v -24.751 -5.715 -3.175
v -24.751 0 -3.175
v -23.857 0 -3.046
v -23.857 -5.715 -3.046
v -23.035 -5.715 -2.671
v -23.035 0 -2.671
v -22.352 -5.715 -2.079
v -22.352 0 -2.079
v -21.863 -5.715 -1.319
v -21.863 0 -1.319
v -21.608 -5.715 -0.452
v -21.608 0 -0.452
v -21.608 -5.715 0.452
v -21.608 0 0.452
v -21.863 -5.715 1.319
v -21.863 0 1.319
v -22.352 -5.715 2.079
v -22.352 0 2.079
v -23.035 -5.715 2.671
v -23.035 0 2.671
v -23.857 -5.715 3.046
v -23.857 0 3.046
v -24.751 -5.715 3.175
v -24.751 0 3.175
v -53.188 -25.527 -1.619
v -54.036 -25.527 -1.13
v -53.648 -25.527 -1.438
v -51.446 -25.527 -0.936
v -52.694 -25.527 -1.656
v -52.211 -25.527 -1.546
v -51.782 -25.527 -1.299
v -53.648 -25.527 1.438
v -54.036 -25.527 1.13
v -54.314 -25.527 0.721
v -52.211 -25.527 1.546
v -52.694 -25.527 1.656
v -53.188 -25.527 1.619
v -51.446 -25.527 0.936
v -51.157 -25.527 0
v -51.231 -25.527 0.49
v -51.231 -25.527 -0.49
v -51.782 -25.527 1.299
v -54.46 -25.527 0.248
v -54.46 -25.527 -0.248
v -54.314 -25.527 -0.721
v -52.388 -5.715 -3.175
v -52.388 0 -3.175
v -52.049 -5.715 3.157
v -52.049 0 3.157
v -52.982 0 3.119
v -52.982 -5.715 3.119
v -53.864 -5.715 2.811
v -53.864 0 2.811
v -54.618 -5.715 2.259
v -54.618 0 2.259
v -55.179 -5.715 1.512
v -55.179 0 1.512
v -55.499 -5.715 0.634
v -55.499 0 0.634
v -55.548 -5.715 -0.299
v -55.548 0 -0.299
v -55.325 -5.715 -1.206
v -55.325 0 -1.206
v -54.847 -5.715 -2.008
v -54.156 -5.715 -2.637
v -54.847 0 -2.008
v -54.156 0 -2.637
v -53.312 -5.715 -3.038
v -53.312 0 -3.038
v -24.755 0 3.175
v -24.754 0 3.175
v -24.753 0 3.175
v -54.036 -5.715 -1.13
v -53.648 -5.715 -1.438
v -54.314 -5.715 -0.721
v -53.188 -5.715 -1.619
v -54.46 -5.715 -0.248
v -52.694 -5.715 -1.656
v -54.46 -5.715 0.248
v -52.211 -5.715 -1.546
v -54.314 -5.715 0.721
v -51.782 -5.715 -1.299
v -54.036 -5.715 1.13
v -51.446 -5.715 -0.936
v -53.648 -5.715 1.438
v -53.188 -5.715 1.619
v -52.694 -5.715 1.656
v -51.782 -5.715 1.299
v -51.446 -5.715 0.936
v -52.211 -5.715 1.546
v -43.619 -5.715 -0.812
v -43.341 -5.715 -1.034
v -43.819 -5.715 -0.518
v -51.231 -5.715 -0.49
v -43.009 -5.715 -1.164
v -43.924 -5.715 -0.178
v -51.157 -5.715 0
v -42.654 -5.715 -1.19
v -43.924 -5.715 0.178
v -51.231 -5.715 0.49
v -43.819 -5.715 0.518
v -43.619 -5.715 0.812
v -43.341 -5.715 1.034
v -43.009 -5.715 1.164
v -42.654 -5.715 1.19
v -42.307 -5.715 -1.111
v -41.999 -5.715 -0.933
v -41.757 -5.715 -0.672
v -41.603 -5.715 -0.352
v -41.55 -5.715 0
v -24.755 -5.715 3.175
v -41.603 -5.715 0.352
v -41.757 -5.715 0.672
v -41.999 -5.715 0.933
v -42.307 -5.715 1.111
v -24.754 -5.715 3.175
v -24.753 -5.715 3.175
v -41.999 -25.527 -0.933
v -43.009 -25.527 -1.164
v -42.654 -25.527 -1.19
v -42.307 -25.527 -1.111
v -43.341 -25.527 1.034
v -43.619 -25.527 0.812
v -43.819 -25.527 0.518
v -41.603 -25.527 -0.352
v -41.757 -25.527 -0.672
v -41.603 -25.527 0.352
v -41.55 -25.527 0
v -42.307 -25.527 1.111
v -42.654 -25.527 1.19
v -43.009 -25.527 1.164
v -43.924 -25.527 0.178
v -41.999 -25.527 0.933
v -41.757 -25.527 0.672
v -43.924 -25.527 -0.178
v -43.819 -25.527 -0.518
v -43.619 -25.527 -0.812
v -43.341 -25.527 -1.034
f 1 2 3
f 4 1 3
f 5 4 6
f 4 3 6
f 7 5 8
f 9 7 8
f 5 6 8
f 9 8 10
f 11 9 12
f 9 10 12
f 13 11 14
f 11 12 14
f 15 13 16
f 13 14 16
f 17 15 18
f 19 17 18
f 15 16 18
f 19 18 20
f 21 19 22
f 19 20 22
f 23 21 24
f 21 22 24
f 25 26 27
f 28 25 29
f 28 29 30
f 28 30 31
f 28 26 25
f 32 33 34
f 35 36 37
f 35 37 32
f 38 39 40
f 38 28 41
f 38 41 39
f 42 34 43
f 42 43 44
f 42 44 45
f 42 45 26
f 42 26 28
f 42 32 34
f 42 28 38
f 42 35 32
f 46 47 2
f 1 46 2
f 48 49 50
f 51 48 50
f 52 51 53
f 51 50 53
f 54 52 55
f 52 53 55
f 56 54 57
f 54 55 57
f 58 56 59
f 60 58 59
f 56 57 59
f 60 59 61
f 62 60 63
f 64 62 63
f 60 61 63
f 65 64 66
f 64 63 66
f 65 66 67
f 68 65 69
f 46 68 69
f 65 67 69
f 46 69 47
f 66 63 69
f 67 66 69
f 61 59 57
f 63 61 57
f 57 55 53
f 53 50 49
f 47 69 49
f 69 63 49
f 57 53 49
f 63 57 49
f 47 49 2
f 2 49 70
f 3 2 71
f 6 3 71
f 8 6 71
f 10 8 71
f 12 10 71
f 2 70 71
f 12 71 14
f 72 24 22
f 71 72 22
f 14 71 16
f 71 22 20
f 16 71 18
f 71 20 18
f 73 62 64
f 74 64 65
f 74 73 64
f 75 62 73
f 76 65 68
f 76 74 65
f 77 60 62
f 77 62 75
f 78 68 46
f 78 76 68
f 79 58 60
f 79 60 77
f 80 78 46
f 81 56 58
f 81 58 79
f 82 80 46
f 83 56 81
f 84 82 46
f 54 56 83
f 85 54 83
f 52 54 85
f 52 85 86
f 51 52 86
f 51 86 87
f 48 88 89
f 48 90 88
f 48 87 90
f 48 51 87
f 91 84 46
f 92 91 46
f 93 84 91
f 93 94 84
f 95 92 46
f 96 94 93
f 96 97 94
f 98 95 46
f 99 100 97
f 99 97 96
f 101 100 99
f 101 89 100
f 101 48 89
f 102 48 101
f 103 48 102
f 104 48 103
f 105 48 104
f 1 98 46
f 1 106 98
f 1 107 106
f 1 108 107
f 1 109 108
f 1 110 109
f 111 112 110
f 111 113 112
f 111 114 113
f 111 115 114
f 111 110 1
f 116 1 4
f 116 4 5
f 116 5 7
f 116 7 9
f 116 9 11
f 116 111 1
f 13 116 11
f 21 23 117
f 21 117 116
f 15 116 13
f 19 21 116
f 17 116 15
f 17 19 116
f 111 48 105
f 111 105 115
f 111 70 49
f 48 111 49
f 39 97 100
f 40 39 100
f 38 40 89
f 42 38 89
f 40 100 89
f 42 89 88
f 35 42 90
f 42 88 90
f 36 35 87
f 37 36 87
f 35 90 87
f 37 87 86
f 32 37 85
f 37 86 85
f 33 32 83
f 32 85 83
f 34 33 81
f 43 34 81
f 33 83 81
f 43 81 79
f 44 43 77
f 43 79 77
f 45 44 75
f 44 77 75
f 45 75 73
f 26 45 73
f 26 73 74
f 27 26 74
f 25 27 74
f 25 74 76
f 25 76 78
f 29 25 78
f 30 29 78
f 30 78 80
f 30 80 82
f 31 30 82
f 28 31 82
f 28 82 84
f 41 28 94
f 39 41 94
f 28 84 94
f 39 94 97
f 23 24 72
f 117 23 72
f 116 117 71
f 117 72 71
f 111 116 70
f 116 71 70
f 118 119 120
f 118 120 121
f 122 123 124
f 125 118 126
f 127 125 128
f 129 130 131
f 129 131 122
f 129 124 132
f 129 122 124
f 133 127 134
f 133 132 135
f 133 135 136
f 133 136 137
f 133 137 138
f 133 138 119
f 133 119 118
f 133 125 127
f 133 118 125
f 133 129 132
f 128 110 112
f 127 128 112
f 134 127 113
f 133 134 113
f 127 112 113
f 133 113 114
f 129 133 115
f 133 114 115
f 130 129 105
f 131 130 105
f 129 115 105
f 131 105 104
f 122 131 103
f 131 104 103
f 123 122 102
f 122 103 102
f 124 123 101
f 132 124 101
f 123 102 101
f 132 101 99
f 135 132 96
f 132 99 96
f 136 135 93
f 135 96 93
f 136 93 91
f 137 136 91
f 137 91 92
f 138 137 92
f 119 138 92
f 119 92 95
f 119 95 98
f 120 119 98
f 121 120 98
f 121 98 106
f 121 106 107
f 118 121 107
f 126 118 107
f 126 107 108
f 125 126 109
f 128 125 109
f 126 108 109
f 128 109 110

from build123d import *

# Parameters (mm, degrees)
F1_DEPTH = 5.715
F2_R     = 1.660999
F2_R_2   = 1.1938
F3_DEPTH = 19.812


with BuildPart() as f1:
    # F0 (on Front) → F1 (new body)
    with BuildSketch(Plane.XZ):
        with BuildLine():
            Line((-24.755399, 3.174997), (-52.048653, 3.156867))
            ThreePointArc((-52.048653, 3.156867), (-55.557965, 0.169667), (-52.387502, -3.175))
            Line((-52.387502, -3.175), (-24.751181, -3.175))
            ThreePointArc((-24.751181, -3.175), (-21.576181, 0), (-24.751181, 3.175))
            ThreePointArc((-24.751181, 3.175), (-24.75329, 3.174999), (-24.755399, 3.174997))
        make_face()
    extrude(amount=F1_DEPTH)

    # F2 (on face) → F3 (join)
    with BuildSketch(Plane.XZ.offset(5.715)):
        with Locations((-52.817982, 0)):
            Circle(F2_R)
        with Locations((-42.743627, 0)):
            Circle(F2_R_2)
    extrude(amount=F3_DEPTH)


solid = f1.part
